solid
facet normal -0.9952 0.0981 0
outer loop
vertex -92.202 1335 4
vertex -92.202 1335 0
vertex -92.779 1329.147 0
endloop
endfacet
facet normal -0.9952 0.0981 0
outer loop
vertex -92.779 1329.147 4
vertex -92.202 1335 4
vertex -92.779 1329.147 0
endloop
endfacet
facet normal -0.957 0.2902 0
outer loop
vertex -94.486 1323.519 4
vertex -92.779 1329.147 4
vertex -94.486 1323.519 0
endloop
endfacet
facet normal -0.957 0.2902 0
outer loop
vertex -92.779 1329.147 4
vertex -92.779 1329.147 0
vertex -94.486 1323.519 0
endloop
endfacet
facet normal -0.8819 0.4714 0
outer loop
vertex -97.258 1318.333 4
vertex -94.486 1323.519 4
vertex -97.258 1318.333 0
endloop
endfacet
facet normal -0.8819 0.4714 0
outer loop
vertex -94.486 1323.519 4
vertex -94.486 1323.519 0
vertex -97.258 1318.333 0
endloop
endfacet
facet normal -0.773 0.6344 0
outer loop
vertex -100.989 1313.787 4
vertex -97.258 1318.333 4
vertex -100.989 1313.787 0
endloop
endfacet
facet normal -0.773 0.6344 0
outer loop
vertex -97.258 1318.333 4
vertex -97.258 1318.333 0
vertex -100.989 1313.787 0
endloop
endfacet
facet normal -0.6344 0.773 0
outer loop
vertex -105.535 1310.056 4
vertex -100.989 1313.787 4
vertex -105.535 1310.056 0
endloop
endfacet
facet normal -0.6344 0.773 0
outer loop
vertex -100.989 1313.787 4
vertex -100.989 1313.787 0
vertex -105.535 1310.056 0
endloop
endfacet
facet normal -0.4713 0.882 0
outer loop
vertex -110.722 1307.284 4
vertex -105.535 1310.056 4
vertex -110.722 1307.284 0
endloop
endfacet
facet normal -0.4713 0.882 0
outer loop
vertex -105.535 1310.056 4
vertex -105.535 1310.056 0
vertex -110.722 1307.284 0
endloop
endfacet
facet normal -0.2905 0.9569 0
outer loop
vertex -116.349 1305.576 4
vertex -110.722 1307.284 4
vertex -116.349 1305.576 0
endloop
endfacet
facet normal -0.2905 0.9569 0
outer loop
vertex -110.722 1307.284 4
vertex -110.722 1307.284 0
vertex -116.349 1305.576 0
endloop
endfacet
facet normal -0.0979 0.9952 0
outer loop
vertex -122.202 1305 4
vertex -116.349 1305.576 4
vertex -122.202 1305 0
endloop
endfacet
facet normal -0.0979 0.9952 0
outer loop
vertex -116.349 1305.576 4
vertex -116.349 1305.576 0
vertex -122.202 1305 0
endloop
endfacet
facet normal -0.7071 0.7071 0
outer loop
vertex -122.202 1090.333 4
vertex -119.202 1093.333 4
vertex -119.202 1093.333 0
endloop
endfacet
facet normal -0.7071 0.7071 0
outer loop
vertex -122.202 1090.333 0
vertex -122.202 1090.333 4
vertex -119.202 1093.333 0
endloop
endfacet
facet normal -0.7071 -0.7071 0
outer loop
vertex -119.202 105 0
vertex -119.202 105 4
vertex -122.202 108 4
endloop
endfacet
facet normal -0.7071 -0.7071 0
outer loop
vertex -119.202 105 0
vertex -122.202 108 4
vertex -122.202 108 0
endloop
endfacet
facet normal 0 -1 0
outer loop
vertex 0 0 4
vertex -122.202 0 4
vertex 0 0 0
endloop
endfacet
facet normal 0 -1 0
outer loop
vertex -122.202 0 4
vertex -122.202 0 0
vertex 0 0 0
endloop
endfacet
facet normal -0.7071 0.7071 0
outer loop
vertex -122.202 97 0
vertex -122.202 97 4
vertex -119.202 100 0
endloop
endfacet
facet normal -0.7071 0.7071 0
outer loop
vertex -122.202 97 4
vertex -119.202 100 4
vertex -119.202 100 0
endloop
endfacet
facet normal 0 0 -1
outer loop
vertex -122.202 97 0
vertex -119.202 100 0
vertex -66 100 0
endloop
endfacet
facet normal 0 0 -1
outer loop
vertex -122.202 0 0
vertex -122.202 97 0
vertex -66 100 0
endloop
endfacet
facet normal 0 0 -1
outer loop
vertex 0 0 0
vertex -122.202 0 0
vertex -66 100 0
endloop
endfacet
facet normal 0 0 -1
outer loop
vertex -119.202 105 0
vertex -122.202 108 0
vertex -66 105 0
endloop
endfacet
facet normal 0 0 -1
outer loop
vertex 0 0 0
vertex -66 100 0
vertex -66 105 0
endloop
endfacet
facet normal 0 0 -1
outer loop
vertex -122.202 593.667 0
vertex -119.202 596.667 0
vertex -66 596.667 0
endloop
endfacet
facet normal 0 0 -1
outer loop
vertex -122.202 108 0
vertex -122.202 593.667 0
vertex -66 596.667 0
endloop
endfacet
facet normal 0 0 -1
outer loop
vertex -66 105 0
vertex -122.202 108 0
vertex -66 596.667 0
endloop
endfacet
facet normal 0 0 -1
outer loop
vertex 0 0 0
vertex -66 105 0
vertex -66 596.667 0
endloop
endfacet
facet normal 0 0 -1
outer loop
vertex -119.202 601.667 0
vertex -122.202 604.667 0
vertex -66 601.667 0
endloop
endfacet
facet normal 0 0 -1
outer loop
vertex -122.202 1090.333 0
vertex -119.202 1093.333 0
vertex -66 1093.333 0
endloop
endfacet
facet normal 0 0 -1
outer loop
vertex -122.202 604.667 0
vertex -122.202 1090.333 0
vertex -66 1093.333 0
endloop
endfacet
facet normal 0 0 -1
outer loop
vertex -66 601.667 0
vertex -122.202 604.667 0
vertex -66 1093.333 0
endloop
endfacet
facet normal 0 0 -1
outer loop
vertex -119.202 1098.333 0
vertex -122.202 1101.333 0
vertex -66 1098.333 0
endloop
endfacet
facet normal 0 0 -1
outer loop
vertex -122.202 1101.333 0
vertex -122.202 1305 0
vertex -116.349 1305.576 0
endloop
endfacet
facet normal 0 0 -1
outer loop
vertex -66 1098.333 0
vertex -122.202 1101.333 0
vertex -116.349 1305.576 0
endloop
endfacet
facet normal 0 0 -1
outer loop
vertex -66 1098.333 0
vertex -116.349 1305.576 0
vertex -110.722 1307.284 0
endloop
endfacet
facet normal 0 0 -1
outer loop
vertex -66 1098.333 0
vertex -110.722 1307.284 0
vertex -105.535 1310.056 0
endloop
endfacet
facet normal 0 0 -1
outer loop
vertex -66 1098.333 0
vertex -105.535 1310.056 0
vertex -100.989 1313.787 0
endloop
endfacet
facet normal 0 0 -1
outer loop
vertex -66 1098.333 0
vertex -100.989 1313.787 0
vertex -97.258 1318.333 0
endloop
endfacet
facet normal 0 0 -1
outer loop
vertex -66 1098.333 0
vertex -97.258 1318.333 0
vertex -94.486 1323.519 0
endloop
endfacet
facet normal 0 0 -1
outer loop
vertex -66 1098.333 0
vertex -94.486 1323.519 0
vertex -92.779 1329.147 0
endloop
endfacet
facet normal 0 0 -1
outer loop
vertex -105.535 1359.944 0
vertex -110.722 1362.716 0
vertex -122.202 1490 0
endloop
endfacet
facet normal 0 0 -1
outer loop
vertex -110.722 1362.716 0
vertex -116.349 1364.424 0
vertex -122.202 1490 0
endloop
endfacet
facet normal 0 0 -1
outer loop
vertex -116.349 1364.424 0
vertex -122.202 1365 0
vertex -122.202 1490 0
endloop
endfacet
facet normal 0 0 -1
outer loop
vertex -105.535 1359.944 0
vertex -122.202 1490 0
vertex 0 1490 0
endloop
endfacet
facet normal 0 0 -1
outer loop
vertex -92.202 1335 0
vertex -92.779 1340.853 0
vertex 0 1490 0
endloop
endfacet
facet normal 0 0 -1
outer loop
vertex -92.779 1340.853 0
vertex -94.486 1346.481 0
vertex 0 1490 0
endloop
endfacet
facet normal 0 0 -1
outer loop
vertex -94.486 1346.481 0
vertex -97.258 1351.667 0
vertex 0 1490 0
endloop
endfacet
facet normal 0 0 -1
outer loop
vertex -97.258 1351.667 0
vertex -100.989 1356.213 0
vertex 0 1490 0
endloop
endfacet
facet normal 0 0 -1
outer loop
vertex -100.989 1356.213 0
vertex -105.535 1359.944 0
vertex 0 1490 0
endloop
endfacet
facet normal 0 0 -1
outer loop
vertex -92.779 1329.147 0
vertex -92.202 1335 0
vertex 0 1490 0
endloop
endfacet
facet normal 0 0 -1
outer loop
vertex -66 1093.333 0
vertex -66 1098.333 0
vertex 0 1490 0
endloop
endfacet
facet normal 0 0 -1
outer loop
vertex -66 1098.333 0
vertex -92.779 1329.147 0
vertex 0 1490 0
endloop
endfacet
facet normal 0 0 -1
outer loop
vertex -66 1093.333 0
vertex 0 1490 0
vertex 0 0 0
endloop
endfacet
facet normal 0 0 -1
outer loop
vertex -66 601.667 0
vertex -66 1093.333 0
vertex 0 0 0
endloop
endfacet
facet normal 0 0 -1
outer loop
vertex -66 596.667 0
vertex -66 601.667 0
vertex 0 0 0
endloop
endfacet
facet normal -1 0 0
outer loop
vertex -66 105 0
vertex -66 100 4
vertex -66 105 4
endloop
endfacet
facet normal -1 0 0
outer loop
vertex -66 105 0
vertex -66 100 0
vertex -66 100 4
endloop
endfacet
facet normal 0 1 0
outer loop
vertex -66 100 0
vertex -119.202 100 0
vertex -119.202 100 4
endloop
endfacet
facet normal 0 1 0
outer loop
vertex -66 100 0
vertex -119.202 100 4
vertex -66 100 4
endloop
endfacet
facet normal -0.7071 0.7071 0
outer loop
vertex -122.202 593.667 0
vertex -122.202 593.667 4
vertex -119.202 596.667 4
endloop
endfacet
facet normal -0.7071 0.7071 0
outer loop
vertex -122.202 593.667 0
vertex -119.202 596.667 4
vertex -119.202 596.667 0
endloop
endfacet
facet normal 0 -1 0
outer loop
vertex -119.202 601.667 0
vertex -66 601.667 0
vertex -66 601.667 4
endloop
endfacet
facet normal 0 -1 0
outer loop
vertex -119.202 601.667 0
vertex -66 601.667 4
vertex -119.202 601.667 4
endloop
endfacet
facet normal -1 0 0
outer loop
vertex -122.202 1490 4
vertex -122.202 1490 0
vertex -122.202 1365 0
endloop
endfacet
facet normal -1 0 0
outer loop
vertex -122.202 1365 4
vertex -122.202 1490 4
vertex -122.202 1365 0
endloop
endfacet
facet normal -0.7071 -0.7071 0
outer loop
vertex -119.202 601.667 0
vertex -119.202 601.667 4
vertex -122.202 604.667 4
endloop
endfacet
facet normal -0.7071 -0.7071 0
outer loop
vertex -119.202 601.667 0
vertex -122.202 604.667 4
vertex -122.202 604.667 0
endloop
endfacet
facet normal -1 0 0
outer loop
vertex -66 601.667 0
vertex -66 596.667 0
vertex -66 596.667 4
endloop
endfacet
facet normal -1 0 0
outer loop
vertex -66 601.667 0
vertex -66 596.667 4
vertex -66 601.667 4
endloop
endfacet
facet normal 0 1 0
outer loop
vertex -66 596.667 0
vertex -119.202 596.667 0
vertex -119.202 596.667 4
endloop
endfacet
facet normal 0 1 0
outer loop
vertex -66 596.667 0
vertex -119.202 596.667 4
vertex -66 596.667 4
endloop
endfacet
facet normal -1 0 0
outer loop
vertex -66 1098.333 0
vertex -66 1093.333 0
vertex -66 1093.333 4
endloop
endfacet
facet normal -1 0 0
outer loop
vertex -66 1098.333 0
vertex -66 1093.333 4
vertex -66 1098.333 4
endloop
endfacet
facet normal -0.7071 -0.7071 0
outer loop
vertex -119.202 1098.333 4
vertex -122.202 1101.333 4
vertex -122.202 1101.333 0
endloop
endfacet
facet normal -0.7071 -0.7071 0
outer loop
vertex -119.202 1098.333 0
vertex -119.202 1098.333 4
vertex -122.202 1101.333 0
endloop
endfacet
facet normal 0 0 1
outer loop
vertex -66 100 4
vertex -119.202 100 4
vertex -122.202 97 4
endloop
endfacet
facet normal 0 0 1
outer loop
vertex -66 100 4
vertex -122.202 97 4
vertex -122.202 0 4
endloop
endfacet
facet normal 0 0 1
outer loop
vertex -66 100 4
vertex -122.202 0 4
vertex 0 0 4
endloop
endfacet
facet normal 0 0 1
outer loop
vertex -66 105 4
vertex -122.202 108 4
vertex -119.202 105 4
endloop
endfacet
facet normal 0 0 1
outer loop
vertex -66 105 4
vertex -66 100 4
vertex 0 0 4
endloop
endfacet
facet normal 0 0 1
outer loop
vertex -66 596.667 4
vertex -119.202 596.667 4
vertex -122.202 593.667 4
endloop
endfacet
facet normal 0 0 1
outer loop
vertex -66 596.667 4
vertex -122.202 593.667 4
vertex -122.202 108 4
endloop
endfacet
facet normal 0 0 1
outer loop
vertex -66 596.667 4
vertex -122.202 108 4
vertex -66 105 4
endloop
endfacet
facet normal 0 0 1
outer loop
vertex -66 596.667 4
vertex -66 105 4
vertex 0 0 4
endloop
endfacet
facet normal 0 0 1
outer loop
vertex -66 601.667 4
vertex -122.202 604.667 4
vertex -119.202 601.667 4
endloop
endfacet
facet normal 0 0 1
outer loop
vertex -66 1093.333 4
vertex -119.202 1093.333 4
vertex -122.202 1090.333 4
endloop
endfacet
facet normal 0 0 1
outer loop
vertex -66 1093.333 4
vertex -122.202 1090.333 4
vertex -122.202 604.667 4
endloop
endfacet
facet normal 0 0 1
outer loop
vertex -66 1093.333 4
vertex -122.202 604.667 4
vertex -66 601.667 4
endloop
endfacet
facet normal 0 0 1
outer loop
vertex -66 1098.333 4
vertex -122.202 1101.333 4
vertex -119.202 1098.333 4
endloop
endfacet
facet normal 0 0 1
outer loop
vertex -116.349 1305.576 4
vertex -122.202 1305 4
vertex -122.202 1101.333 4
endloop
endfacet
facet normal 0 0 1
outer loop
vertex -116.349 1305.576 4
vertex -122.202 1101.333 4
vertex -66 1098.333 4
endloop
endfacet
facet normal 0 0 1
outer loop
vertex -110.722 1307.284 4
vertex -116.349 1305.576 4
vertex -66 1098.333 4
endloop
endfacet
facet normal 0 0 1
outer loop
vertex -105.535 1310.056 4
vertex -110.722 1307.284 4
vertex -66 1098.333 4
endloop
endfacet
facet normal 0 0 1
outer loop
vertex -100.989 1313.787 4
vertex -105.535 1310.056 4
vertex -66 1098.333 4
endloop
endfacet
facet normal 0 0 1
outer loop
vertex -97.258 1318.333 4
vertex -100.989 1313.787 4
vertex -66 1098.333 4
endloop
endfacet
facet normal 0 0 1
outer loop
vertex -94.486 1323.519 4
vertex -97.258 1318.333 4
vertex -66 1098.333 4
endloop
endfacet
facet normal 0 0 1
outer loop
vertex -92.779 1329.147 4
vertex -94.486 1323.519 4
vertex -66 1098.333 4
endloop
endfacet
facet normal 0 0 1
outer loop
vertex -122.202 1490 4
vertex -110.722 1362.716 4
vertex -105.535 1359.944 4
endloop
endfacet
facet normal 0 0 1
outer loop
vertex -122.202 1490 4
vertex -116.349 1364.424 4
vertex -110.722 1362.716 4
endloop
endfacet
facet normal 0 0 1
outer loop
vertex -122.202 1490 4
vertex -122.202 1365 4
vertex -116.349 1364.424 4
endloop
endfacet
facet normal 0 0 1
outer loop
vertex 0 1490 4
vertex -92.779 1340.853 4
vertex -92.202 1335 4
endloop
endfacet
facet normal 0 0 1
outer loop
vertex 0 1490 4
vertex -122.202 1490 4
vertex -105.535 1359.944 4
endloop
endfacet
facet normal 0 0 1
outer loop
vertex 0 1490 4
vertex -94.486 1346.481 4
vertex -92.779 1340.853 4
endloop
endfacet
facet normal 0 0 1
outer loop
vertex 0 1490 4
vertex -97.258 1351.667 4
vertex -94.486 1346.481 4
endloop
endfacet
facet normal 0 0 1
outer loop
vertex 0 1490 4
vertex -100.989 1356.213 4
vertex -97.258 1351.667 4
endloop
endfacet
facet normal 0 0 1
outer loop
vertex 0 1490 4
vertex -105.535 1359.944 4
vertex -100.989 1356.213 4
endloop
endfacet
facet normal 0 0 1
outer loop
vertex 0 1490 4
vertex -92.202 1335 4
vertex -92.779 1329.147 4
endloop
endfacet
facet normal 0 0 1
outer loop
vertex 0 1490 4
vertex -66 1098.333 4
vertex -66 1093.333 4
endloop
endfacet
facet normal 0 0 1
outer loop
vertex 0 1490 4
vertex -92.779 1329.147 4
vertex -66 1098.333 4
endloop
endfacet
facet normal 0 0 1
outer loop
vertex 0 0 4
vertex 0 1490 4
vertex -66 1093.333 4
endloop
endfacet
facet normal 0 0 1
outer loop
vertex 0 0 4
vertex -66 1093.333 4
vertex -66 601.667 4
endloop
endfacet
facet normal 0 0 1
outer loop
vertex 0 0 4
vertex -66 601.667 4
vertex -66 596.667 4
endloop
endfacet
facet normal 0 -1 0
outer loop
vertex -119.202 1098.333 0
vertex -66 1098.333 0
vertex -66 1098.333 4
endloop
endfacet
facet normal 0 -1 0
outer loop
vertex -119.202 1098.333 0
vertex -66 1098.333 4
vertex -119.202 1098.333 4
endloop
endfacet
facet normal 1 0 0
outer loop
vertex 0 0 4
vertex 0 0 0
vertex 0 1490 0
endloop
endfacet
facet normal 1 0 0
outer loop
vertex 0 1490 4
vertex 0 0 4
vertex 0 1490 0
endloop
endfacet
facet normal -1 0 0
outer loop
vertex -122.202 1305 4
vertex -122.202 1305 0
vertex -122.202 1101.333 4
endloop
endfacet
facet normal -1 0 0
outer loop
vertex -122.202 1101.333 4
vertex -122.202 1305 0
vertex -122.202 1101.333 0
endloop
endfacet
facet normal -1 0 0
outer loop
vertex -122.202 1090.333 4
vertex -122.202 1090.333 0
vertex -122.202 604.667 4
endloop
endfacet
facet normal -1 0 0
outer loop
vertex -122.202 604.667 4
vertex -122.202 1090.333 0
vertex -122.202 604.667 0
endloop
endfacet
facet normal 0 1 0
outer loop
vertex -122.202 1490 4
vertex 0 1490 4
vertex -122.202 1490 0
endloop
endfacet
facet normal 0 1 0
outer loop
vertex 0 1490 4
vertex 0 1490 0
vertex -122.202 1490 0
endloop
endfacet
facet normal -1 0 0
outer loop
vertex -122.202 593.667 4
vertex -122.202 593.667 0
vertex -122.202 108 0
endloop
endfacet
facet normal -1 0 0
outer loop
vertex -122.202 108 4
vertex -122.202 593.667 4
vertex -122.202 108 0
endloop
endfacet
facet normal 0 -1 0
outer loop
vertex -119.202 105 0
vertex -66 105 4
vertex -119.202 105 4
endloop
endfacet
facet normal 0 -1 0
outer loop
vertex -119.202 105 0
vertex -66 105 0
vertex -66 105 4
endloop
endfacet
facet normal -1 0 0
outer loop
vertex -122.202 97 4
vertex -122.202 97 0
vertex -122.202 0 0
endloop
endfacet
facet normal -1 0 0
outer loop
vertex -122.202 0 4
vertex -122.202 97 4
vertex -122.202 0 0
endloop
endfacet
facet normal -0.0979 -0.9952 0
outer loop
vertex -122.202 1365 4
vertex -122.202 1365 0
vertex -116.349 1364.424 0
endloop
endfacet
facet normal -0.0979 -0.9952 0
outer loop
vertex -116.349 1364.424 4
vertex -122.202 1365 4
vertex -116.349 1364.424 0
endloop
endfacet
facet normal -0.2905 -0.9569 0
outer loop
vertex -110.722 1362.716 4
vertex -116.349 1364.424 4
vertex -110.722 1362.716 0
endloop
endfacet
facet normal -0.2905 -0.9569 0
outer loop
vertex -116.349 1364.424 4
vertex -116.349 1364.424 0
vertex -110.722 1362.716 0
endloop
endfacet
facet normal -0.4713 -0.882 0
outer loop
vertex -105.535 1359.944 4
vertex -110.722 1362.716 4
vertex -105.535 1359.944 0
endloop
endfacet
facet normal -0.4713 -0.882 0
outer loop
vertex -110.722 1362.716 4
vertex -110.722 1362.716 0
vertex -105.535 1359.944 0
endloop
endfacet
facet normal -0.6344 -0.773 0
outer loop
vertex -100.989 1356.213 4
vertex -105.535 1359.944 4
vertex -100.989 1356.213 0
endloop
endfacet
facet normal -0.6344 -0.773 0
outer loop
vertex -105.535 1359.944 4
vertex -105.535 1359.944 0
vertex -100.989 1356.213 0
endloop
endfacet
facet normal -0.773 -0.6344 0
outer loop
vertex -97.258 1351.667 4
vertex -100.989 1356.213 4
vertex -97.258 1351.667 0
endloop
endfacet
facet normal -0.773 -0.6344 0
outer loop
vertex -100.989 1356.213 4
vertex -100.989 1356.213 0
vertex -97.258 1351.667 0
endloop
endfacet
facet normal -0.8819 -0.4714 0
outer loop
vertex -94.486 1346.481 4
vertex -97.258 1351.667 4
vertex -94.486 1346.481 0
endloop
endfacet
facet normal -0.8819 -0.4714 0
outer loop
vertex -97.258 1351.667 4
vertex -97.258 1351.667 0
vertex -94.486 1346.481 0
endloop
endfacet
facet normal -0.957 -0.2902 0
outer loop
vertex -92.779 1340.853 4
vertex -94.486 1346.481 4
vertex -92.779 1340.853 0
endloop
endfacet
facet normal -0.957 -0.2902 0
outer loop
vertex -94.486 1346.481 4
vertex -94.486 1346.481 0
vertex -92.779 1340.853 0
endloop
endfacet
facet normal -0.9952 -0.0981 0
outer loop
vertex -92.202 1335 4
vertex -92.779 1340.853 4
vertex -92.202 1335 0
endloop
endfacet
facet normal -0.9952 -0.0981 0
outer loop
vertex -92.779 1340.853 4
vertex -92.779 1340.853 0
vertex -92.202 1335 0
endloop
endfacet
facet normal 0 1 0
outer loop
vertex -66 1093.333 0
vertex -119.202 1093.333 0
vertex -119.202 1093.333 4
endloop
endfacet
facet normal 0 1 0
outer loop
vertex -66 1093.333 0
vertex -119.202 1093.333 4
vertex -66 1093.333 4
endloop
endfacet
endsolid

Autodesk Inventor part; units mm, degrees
ref_plane "YZ Plane" through (0, 0, 0) normal (1, 0, 0) x (0, 1, 0)
ref_plane "XZ Plane" through (0, 0, 0) normal (0, 1, 0) x (-1, 0, 0)
ref_plane "XY Plane" through (0, 0, 0) normal (0, 0, 1) x (1, 0, 0)
sketch "Sketch1" plane through (0, 0, 0) normal (0, 0, 1) x (1, 0, 0)
  line L0 (0, 1490) -> (-122.2022, 1490)
  line L1 (-122.2022, 1490) -> (-122.2022, 0)
  line L2 (-122.2022, 0) -> (0, 0)
  line L3 (0, 0) -> (0, 1490)
  line L4 (-122.2022, 100) -> (-66, 100)
  line L5 (-66, 100) -> (-66, 105)
  line L6 (-66, 105) -> (-122.2022, 105)
  line L7 (-122.2022, 105) -> (-122.2022, 100)
  line L8 (-122.2022, 596.6667) -> (-66, 596.6667)
  line L9 (-66, 596.6667) -> (-66, 601.6667)
  line L10 (-66, 601.6667) -> (-122.2022, 601.6667)
  line L11 (-122.2022, 601.6667) -> (-122.2022, 596.6667)
  line L12 (-122.2022, 1093.3333) -> (-66, 1093.3333)
  line L13 (-66, 1093.3333) -> (-66, 1098.3333)
  line L14 (-66, 1098.3333) -> (-122.2022, 1098.3333)
  line L15 (-122.2022, 1098.3333) -> (-122.2022, 1093.3333)
  circle A0 centre (-122.2022, 1335) radius 30
  point P0 (-122.2022, 1098.3333)
  point P1 (-122.2022, 1093.3333)
  point P2 (-122.2022, 601.6667)
  point P3 (-122.2022, 596.6667)
  point P4 (-122.2022, 105)
  point P5 (-122.2022, 1365)
  point P6 (-122.2022, 1305)
  dimension "d0" = 1490
  dimension "d1" = 122.2022
  dimension "d2" = 5
  dimension "d4" = 100
  dimension "d7" = 496.6667
  dimension "d23" = 66
  dimension "d29" = 60
  dimension "d30" = 1335
extrude "Plate1" add sketch "Sketch1" along normal blind 4 contours L3 L2 L1 L4 L5 L6 L8 L9 L10 L12 L13 L14 A0 L0
chamfer "Corner Chamfer1" distance 3 angle 45 6 edges at (-122.2022, 100, 2) (-122.2022, 105, 2) (-122.2022, 596.6667, 2) (-122.2022, 601.6667, 2) (-122.2022, 1098.3333, 2) (-122.2022, 1093.3333, 2)
equation "\"d0\" = Стрингер_длина"
equation "\"d1\" = стрингер_глубина_7"
equation "\"d2\" = паз_под_стрингер_толщина"
equation "\"d7\" = Шаг_шпангоутов"
equation "\"d23\" = паз_под_стрингер_глубина - Thickness"
equation "\"d29\" = 2 * радиус_выреза_под_сварку"
equation "\"d12\" = Thickness"
equation "\"BendRadius\" = Thickness"
equation "\"BendReliefWidth\" = Thickness"
equation "\"BendReliefDepth\" = 0.5 * Thickness"
equation "\"CornerReliefSize\" = 4 * Thickness"
equation "\"MinimumRemnant\" = 2 * Thickness"
equation "\"TransitionRadius\" = BendRadius"
equation "\"JacobiRadiusSize\" = BendRadius"
equation "\"GapSize\" = Thickness"
equation "\"Стрингер_длина\" = 1490"
equation "\"стрингер_глубина_7\" = 122.202218"
equation "\"паз_под_стрингер_толщина\" = 5"
equation "\"Шаг_шпангоутов\" = 496.666667"
equation "\"паз_под_стрингер_глубина\" = 70"
equation "\"Thickness\" = 4"
equation "\"радиус_выреза_под_сварку\" = 30"
properties part number "01013 GBK stringer C7" material "Steel"
